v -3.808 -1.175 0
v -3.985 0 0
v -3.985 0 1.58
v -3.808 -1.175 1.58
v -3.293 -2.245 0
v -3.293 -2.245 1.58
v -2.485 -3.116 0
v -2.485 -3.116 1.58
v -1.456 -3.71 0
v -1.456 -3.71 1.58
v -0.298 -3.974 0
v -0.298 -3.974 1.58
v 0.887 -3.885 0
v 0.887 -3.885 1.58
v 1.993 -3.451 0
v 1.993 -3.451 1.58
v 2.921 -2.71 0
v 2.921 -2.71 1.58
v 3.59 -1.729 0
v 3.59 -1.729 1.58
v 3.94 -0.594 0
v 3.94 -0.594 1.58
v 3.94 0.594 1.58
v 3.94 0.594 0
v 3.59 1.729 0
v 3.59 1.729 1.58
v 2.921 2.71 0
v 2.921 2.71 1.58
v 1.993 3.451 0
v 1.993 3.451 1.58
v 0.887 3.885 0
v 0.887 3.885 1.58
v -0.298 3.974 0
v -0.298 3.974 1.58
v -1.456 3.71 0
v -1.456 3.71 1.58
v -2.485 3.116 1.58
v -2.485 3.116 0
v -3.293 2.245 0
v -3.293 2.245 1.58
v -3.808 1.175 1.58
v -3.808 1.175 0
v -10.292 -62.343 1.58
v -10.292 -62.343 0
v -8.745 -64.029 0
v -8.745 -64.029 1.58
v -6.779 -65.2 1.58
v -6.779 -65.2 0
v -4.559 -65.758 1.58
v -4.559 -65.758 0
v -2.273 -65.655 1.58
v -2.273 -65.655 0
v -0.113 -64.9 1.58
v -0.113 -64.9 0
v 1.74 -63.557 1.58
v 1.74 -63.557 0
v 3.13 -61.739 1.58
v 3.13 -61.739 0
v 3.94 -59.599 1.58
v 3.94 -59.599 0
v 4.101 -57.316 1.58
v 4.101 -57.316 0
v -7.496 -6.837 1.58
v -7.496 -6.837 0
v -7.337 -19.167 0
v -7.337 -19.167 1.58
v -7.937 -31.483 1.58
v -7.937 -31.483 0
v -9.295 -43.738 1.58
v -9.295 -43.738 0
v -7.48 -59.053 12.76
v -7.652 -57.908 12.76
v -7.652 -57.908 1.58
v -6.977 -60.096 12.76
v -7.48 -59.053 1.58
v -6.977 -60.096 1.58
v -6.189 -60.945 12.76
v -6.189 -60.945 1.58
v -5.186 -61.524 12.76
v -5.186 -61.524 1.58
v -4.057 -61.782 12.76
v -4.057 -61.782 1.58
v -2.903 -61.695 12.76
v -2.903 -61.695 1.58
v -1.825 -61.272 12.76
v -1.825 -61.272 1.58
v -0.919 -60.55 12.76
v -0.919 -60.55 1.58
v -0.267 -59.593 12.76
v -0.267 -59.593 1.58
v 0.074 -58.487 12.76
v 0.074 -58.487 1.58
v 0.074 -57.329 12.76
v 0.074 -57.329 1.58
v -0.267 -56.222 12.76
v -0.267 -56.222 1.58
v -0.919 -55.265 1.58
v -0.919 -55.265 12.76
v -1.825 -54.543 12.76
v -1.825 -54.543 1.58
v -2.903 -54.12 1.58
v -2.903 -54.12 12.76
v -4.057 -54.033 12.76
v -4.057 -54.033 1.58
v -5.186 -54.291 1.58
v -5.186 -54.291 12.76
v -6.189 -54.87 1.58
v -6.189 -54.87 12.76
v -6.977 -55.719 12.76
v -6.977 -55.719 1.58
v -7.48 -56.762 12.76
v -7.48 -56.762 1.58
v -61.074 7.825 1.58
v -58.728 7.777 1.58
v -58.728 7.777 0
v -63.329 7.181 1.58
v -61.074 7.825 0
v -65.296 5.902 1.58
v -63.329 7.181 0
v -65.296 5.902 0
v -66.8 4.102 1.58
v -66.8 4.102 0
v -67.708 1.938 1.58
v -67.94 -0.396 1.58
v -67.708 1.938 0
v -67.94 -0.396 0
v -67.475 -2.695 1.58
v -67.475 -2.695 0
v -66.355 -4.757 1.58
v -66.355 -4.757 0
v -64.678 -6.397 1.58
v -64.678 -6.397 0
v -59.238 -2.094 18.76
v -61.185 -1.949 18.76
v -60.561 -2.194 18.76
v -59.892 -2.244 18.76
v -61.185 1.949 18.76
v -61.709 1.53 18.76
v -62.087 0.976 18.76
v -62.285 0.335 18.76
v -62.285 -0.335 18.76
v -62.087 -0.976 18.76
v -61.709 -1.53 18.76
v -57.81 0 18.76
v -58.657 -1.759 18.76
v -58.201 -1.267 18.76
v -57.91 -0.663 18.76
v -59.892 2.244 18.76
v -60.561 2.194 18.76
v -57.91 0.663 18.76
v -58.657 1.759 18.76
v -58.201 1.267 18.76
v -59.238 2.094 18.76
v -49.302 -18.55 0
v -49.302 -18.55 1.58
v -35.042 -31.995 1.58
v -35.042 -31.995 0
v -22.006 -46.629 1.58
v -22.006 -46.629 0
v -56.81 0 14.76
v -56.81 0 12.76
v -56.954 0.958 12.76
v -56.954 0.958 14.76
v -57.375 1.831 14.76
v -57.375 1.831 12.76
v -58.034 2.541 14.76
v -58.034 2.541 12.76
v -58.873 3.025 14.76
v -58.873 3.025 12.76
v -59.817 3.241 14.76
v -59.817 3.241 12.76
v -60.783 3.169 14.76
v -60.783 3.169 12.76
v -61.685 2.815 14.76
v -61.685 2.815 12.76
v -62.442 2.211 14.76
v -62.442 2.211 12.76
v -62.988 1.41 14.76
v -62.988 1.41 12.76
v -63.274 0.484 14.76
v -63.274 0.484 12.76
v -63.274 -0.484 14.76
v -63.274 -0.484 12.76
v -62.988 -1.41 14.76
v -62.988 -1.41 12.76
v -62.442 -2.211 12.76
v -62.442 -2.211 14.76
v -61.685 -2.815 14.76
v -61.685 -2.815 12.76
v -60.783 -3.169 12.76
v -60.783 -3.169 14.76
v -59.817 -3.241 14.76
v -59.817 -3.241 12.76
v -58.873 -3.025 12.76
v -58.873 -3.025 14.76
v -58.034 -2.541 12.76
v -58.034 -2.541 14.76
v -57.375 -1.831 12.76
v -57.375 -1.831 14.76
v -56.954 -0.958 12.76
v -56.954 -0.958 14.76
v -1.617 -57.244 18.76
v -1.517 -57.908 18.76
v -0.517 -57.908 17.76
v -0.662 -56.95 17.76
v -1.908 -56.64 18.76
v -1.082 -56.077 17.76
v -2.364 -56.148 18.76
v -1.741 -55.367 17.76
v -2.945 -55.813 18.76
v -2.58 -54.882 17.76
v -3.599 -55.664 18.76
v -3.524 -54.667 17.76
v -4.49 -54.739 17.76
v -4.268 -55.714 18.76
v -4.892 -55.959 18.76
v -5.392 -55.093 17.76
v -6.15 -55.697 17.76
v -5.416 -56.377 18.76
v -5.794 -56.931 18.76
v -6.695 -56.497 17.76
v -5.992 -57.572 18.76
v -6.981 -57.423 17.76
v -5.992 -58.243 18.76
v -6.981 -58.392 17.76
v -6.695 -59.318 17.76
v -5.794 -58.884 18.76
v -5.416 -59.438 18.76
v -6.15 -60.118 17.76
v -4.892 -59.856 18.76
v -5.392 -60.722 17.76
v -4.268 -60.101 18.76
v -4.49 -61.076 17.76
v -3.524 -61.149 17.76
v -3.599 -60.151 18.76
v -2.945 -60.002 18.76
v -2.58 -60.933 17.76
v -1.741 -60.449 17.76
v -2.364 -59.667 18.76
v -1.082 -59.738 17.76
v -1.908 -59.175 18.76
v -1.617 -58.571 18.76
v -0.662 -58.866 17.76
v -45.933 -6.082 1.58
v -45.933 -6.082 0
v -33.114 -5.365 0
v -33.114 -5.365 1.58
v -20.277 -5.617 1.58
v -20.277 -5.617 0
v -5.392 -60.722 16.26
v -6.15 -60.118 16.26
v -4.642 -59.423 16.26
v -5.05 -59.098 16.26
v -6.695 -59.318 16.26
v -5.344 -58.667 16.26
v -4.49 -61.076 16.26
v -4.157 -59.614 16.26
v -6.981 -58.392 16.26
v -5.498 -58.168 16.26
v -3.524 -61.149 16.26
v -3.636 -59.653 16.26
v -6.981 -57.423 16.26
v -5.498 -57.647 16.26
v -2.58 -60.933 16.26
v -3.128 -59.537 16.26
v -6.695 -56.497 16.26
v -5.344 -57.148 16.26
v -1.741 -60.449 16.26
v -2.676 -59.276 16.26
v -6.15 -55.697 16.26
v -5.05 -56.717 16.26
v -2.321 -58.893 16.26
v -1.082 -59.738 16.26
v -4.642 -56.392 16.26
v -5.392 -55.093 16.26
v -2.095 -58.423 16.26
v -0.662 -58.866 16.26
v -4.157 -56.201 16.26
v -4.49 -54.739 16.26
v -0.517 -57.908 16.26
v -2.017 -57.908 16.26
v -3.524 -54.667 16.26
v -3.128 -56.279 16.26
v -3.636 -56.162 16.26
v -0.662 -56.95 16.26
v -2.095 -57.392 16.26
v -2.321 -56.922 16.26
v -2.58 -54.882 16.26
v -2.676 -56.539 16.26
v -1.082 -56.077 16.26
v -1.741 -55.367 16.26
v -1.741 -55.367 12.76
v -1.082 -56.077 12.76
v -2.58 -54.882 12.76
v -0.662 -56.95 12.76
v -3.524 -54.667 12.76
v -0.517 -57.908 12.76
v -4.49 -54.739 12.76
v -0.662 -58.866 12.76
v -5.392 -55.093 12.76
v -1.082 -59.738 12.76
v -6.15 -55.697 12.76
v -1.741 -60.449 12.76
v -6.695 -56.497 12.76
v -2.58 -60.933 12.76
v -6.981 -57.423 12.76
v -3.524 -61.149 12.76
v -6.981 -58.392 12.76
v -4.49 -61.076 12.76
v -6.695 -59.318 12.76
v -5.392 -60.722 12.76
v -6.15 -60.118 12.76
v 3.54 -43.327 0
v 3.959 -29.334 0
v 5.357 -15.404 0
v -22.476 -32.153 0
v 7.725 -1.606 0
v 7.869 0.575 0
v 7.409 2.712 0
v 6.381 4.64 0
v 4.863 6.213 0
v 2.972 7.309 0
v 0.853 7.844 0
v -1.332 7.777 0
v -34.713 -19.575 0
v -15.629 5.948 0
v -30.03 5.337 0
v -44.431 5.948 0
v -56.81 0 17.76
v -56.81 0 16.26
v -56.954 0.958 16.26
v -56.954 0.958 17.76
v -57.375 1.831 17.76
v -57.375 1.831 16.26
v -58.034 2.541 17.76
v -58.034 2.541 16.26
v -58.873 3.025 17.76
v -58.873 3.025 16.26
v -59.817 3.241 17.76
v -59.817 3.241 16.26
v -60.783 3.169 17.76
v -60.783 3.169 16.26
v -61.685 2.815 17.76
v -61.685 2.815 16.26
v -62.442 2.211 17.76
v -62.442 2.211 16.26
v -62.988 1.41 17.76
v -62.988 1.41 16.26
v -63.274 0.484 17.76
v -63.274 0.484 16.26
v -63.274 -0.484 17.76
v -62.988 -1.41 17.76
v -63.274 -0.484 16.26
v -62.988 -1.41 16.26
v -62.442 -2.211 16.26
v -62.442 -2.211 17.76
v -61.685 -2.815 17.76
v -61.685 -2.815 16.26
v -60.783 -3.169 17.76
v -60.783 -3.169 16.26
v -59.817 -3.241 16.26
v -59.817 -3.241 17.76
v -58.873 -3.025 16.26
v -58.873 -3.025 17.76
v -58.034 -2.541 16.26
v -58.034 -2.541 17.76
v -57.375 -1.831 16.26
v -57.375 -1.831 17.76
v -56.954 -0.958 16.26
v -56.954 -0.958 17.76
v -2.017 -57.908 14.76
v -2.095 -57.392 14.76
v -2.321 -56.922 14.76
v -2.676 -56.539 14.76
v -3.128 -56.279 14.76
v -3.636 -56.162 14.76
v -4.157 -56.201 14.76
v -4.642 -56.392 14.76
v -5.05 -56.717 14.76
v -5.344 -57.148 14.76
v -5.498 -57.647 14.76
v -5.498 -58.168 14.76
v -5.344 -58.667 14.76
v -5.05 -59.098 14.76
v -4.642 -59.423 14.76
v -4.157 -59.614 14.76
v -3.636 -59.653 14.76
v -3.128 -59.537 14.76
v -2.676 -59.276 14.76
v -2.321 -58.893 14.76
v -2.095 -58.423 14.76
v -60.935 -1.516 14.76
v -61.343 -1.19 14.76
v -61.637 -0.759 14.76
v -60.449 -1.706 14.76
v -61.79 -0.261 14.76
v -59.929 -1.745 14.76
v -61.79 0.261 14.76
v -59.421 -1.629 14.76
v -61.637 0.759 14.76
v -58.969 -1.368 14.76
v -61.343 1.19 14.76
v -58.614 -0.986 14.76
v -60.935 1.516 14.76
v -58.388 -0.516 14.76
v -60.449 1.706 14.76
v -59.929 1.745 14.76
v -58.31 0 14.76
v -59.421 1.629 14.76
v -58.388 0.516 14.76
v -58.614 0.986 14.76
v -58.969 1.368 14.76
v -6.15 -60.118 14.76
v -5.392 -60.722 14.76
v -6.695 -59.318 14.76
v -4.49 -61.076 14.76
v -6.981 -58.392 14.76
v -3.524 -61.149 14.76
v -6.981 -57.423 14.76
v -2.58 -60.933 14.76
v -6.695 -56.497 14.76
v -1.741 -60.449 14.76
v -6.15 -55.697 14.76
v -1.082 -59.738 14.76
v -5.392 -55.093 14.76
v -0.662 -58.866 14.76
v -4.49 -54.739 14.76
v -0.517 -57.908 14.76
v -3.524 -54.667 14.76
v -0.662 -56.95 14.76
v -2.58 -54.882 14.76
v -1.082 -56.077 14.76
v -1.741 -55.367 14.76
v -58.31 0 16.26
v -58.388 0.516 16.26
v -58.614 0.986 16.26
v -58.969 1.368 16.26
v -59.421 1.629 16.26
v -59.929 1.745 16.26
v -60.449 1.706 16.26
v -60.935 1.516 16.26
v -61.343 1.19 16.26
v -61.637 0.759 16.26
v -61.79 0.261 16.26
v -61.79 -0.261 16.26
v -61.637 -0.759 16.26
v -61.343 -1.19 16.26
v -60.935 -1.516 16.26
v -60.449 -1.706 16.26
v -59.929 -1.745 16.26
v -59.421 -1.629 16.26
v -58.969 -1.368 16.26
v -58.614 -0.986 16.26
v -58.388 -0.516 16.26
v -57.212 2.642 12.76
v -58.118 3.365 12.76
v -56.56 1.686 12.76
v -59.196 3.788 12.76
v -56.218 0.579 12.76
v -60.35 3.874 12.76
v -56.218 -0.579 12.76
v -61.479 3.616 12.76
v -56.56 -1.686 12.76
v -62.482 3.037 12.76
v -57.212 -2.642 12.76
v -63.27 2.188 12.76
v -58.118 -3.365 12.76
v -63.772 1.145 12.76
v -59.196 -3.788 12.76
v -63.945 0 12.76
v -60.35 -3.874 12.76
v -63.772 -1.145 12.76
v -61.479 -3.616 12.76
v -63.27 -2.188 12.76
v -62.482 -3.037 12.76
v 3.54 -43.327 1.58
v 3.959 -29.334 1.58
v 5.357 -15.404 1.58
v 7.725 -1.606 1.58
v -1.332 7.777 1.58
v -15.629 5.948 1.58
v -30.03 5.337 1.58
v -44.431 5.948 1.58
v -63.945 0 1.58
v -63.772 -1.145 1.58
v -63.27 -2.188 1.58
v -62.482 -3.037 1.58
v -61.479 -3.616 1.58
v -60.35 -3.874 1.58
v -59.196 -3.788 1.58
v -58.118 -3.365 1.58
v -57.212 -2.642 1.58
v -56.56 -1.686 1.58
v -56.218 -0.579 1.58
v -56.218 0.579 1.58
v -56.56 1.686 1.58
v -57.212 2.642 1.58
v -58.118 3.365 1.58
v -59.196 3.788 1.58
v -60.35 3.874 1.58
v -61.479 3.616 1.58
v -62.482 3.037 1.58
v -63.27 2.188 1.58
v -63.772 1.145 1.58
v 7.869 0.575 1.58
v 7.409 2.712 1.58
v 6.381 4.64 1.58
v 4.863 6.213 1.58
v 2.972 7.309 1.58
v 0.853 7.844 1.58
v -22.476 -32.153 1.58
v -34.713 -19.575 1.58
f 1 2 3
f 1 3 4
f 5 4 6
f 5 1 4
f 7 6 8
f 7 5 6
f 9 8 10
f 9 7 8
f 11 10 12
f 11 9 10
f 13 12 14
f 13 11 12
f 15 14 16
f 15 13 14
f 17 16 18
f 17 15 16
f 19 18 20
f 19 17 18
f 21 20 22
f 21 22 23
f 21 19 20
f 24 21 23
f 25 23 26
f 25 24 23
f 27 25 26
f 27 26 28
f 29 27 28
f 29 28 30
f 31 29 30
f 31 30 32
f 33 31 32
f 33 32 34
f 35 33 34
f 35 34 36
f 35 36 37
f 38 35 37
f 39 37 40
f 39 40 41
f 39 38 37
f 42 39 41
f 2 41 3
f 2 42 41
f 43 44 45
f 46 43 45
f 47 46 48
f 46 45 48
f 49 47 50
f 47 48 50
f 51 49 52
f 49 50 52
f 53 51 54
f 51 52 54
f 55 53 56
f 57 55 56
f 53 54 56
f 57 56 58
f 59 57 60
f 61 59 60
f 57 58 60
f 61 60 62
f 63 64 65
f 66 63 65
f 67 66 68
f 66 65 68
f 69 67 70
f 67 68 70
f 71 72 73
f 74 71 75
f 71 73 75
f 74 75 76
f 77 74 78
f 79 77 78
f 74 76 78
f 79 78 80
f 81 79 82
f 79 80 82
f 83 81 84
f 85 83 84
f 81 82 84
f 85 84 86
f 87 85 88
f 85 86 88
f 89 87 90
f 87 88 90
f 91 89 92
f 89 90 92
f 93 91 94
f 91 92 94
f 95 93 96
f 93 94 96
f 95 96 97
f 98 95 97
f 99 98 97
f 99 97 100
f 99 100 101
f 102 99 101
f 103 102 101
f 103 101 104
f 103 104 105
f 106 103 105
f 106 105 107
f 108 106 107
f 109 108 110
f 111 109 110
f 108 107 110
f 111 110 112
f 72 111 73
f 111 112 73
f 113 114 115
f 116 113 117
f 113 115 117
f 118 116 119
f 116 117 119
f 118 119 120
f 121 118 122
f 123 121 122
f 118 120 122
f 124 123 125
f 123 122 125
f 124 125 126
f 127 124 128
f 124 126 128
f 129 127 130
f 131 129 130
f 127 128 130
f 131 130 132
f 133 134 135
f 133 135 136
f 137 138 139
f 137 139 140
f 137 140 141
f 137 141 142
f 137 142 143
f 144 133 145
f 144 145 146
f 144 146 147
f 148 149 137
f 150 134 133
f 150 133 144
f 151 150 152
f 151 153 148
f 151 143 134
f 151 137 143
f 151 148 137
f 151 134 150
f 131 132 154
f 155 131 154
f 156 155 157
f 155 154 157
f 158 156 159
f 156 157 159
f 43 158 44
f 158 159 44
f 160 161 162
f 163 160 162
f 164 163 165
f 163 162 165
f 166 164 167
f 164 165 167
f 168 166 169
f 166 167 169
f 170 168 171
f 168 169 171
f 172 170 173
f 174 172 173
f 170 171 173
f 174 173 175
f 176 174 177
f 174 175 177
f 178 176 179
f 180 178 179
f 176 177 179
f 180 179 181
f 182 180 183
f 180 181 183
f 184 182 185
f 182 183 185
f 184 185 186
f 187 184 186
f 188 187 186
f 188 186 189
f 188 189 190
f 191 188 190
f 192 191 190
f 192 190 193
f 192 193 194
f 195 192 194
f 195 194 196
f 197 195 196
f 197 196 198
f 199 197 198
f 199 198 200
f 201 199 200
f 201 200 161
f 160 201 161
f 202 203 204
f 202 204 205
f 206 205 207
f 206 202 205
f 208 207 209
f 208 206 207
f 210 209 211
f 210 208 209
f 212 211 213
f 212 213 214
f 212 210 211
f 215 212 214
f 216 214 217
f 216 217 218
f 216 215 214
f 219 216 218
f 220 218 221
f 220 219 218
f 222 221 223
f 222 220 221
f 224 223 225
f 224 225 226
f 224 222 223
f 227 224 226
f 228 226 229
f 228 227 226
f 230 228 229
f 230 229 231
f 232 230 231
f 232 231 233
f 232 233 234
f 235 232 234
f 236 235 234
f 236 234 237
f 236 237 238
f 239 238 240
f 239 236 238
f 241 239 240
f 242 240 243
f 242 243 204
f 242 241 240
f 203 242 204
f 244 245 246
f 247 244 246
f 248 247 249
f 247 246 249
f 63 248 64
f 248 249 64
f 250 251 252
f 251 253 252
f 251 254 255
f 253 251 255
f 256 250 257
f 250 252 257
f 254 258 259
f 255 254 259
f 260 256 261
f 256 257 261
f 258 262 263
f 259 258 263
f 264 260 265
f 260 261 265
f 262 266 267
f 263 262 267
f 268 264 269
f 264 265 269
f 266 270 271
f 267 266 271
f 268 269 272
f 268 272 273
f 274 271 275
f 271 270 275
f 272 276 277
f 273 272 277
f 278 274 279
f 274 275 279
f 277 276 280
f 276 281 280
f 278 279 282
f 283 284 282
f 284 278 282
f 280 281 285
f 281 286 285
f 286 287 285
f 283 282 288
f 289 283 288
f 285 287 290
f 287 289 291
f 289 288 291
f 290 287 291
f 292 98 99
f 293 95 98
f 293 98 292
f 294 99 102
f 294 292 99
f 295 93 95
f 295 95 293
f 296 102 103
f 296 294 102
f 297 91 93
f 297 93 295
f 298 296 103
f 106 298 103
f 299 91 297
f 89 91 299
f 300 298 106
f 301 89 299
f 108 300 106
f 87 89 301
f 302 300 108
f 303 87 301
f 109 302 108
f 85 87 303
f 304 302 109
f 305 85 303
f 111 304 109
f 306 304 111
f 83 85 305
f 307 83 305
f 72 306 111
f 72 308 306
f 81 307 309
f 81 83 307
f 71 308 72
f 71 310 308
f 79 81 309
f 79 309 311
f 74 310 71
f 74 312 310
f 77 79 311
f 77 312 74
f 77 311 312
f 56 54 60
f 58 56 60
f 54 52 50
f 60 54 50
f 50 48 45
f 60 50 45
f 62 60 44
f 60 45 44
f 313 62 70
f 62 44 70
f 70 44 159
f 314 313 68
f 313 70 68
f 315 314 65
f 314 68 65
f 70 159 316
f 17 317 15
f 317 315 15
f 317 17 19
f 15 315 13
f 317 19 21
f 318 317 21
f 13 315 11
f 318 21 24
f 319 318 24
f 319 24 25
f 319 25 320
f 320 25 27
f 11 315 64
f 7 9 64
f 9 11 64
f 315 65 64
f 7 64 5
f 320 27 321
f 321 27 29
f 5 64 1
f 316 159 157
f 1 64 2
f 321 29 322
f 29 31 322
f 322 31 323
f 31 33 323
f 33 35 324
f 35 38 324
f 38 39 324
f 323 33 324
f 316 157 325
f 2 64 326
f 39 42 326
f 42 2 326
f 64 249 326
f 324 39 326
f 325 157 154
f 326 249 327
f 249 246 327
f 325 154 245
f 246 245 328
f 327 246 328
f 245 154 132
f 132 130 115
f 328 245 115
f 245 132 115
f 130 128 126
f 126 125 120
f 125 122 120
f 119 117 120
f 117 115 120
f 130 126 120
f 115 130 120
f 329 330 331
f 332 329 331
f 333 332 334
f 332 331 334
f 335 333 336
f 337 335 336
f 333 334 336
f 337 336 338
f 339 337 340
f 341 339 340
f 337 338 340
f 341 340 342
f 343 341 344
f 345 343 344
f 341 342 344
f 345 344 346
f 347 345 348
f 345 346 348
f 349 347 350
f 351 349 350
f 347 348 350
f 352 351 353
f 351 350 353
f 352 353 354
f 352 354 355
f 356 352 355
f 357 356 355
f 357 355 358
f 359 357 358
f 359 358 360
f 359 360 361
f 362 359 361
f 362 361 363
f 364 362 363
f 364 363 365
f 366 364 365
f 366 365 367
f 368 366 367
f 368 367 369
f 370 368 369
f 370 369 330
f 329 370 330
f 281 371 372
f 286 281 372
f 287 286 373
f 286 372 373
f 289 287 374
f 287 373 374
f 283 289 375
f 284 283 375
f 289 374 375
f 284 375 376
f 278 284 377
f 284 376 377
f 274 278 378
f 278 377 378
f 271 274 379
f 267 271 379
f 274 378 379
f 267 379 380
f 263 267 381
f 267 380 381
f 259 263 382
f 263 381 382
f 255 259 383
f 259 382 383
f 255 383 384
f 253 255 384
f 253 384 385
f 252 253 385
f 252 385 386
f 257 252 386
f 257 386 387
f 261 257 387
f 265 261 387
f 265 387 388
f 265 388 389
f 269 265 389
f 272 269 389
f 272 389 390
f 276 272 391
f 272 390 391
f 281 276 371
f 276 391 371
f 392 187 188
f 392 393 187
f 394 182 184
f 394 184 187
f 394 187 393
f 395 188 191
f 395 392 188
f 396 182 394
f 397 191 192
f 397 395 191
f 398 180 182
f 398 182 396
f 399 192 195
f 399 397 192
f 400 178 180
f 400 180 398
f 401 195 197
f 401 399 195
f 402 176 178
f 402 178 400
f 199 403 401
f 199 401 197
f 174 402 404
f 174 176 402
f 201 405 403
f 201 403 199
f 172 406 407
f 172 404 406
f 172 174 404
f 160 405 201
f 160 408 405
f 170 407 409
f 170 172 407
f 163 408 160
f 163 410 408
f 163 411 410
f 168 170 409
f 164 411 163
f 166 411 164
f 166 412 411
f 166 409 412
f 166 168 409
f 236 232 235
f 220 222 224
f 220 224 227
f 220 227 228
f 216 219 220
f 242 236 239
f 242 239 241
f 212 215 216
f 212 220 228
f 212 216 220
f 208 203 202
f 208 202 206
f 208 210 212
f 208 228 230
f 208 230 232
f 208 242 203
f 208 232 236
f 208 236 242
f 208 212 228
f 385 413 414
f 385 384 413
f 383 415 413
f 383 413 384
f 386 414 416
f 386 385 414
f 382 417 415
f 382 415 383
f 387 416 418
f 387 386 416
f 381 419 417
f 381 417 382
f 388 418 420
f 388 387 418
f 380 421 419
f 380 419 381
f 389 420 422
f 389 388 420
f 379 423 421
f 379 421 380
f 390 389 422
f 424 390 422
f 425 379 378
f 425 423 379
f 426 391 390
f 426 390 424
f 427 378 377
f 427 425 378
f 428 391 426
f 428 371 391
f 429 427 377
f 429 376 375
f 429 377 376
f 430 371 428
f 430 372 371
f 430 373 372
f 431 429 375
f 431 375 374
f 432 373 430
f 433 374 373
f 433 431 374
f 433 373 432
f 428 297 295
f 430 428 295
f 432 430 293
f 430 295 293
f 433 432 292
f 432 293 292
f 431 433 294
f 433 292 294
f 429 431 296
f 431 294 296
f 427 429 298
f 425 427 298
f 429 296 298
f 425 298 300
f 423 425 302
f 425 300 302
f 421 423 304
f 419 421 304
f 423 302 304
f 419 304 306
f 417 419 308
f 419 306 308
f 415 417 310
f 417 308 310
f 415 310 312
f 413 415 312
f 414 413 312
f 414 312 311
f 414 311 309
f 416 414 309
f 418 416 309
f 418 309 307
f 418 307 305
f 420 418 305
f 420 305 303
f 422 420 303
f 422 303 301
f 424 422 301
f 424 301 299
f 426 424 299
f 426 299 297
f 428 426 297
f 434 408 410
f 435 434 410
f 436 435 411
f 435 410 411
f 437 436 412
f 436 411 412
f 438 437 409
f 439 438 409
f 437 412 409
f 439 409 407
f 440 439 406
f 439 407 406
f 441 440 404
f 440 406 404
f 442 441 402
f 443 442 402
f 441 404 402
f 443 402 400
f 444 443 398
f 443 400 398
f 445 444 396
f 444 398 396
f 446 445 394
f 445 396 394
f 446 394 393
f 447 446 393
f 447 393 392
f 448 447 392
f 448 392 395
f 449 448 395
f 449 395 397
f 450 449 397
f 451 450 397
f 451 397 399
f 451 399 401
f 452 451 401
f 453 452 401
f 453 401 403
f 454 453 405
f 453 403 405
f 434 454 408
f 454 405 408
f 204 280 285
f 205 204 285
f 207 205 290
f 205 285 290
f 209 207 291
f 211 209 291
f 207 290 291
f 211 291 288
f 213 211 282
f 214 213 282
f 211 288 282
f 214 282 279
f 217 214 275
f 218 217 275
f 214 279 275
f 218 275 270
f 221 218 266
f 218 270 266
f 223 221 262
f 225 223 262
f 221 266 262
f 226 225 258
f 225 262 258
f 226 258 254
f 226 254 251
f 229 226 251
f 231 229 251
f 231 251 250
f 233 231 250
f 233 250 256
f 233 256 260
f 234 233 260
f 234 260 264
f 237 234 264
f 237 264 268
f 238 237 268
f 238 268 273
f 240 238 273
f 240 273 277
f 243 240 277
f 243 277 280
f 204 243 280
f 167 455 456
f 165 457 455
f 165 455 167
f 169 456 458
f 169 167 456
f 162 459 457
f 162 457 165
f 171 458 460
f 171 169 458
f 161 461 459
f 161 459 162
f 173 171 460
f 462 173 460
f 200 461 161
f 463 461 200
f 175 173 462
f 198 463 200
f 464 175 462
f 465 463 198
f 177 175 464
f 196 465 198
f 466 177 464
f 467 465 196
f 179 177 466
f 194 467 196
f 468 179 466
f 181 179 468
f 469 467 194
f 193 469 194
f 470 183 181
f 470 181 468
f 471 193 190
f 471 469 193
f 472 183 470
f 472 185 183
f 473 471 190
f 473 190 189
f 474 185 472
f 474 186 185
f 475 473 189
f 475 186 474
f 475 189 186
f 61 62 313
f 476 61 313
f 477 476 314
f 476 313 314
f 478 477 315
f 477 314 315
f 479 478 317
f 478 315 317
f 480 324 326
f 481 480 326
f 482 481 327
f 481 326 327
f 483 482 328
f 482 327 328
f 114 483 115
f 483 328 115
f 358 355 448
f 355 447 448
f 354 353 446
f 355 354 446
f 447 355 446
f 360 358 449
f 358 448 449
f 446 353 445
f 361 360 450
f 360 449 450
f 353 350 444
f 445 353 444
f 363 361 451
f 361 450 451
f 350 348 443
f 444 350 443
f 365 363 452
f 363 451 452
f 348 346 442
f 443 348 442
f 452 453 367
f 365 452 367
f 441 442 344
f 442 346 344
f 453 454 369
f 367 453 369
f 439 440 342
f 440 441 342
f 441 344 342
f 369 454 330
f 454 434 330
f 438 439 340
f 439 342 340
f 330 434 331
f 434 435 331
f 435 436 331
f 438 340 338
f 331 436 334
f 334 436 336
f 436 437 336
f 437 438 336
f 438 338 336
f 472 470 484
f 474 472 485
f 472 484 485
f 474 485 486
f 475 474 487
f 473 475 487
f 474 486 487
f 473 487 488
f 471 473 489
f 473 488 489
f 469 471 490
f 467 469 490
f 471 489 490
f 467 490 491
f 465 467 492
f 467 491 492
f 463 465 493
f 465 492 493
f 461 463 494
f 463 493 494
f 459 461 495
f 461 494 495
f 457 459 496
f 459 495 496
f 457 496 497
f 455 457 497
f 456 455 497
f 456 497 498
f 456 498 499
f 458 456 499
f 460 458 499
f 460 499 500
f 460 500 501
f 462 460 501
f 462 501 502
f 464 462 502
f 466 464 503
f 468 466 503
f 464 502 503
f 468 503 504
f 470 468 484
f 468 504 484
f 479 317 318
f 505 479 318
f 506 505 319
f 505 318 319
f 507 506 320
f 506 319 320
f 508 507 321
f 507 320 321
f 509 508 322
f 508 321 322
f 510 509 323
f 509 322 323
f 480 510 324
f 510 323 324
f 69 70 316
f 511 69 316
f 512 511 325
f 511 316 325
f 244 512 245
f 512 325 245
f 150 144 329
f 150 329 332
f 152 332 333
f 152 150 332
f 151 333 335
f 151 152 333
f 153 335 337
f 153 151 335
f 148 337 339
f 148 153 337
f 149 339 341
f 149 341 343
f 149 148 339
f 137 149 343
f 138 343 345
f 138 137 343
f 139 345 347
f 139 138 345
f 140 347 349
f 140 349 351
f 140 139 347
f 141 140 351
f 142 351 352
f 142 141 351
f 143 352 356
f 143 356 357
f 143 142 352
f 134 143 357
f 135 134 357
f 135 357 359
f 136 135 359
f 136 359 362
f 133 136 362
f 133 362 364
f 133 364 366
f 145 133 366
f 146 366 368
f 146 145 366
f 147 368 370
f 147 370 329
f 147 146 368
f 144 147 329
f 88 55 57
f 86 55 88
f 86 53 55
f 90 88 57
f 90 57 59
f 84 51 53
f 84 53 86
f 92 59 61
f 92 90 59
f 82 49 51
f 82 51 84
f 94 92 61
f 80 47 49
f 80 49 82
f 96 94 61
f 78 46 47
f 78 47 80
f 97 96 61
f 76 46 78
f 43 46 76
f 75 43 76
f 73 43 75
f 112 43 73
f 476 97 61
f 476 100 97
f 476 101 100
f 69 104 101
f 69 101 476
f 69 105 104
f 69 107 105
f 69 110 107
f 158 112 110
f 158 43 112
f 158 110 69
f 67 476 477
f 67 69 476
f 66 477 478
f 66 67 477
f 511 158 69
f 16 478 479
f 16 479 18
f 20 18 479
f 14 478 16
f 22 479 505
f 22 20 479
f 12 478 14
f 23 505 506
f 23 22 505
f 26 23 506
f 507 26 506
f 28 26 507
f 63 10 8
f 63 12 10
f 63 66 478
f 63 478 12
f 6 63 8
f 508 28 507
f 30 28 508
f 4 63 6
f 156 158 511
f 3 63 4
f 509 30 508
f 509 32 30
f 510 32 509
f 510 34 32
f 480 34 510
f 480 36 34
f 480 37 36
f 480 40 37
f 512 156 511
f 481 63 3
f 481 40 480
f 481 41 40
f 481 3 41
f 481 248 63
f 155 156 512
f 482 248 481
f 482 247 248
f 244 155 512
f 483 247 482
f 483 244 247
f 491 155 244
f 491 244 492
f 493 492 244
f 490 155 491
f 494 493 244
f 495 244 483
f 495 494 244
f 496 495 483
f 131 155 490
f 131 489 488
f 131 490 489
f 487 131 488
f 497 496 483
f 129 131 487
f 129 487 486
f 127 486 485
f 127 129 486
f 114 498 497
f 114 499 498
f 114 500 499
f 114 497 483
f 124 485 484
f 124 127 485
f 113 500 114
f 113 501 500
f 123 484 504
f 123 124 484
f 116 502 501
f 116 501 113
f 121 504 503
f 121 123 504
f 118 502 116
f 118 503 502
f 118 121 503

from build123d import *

# Parameters (mm, degrees)
ESQUISSE1_R             = 7.89
ESQUISSE1_R_2           = 3.885
ESQUISSE1_R_3           = 3.985
BOSS_EXTRU_1_DEPTH      = 1.58
BOSS_EXTRU_2_START      = 1.58
ESQUISSE1_3_R           = 3.885
BOSS_EXTRU_2_DEPTH      = 11.18
ESQUISSE2_R             = 3.25
BOSS_EXTRU_3_DEPTH      = 6
ENL_V_START             = -4
ESQUISSE3_R             = 3.25
ESQUISSE3_R_2           = 1.75
ENL_V_MAT_EXTRU_1_DEPTH = 1.5
CHANFREIN1_SIZE         = 1


with BuildPart() as part:
    # Esquisse1 → Boss.-Extru.1 (new body)
    # profile 1 of 11: a face of its own
    with BuildSketch(Plane(origin=(0, 0, 0), x_dir=(0, 1, 0), z_dir=(0, 0, 1))):
        with Locations((-57.907596038, 3.76712371)):
            Circle(ESQUISSE1_R)
        with Locations((-57.907596038, 3.76712371)):
            Circle(ESQUISSE1_R_2, mode=Mode.SUBTRACT)
    # profile 2 of 11: a face of its own
    with BuildSketch(Plane(origin=(0, 0, 0), x_dir=(0, 1, 0), z_dir=(0, 0, 1))):
        with Locations((-57.907596038, 3.76712371)):
            Circle(ESQUISSE1_R_2)
    # profile 3 of 11: a face of its own
    with BuildSketch(Plane(origin=(0, 0, 0), x_dir=(0, 1, 0), z_dir=(0, 0, 1))):
        with BuildLine():
            ThreePointArc((-56.301538768, 11.491933095), (-51.786979572, 8.746094895), (-50.017596038, 3.76712371))
            ThreePointArc((-50.017596038, 3.76712371), (-50.400051579, 1.340423031), (-51.510340319, -0.851016528))
            ThreePointArc((-51.510340319, -0.851016528), (-47.696280505, 4.277310952), (-43.738103365, 9.295241675))
            ThreePointArc((-43.738103365, 9.295241675), (-50.037335941, 10.293415373), (-56.301538768, 11.491933095))
        make_face()
    # profile 4 of 11: a face of its own
    with BuildSketch(Plane(origin=(0, 0, 0), x_dir=(0, 1, 0), z_dir=(0, 0, 1))):
        with BuildLine():
            ThreePointArc((-62.343020281, 10.292390891), (-59.444168438, 11.506054208), (-56.301538768, 11.491933095))
            ThreePointArc((-56.301538768, 11.491933095), (-50.037335941, 10.293415373), (-43.738103365, 9.295241675))
            ThreePointArc((-43.738103365, 9.295241675), (-25.983312523, 28.716933044), (-6.082429339, 45.932900691))
            ThreePointArc((-6.082429339, 45.932900691), (-6.808122629, 52.346571885), (-7.776764583, 58.728071842))
            ThreePointArc((-7.776764583, 58.728071842), (-7.686126552, 61.842009718), (-6.39725572, 64.678140238))
            ThreePointArc((-6.39725572, 64.678140238), (-31.994708958, 35.041699087), (-62.343020281, 10.292390891))
        make_face()
    # profile 5 of 11: a face of its own
    with BuildSketch(Plane(origin=(0, 0, 0), x_dir=(0, 1, 0), z_dir=(0, 0, 1))):
        with BuildLine():
            ThreePointArc((-7.776764583, 58.728071842), (-6.808122629, 52.346571885), (-6.082429339, 45.932900691))
            ThreePointArc((-6.082429339, 45.932900691), (-0.878320654, 49.809662788), (4.435424243, 53.534732819))
            ThreePointArc((4.435424243, 53.534732819), (-3.087690297, 52.799265283), (-7.776764583, 58.728071842))
        make_face()
    # profile 6 of 11: a face of its own
    with BuildSketch(Plane(origin=(0, 0, 0), x_dir=(0, 1, 0), z_dir=(0, 0, 1))):
        with Locations((0, 60.06)):
            Circle(ESQUISSE1_R)
        with Locations((0, 60.06)):
            Circle(ESQUISSE1_R_2, mode=Mode.SUBTRACT)
    # profile 7 of 11: a face of its own
    with BuildSketch(Plane(origin=(0, 0, 0), x_dir=(0, 1, 0), z_dir=(0, 0, 1))):
        with Locations((0, 60.06)):
            Circle(ESQUISSE1_R_2)
    # profile 8 of 11: a face of its own
    with BuildSketch(Plane(origin=(0, 0, 0), x_dir=(0, 1, 0), z_dir=(0, 0, 1))):
        with BuildLine():
            ThreePointArc((-43.738103365, 9.295241675), (-47.696280505, 4.277310952), (-51.510340319, -0.851016528))
            ThreePointArc((-51.510340319, -0.851016528), (-54.053844003, -3.117692573), (-57.315900013, -4.100658431))
            ThreePointArc((-57.315900013, -4.100658431), (-29.333901967, -3.959332501), (-1.606057271, -7.724809386))
            ThreePointArc((-1.606057271, -7.724809386), (-6.520388042, -4.442593812), (-7.776764583, 1.331928158))
            ThreePointArc((-7.776764583, 1.331928158), (-7.278629827, 4.40977224), (-6.837025839, 7.496234348))
            ThreePointArc((-6.837025839, 7.496234348), (-25.32919367, 7.541846284), (-43.738103365, 9.295241675))
        make_face()
    # profile 9 of 11: a face of its own
    with BuildSketch(Plane(origin=(0, 0, 0), x_dir=(0, 1, 0), z_dir=(0, 0, 1))):
        with BuildLine():
            ThreePointArc((4.435424243, 53.534732819), (-0.878320654, 49.809662788), (-6.082429339, 45.932900691))
            ThreePointArc((-6.082429339, 45.932900691), (-5.369716255, 26.693168194), (-6.837025839, 7.496234348))
            ThreePointArc((-6.837025839, 7.496234348), (-3.712908005, 7.657586059), (-0.591696025, 7.867782141))
            ThreePointArc((-0.591696025, 7.867782141), (4.85650588, 6.218235331), (7.776764583, 1.331928158))
            ThreePointArc((7.776764583, 1.331928158), (5.336964728, 30.03), (7.776764583, 58.728071842))
            ThreePointArc((7.776764583, 58.728071842), (6.635290614, 55.790922996), (4.435424243, 53.534732819))
        make_face()
    # profile 10 of 11: a face of its own
    with BuildSketch(Plane(origin=(0, 0, 0), x_dir=(0, 1, 0), z_dir=(0, 0, 1))):
        with BuildLine():
            ThreePointArc((-0.591696025, 7.867782141), (-3.712908005, 7.657586059), (-6.837025839, 7.496234348))
            ThreePointArc((-6.837025839, 7.496234348), (-7.278629827, 4.40977224), (-7.776764583, 1.331928158))
            ThreePointArc((-7.776764583, 1.331928158), (-5.309155306, 5.836520362), (-0.591696025, 7.867782141))
        make_face()
    # profile 11 of 11: a face of its own
    with BuildSketch(Plane(origin=(0, 0, 0), x_dir=(0, 1, 0), z_dir=(0, 0, 1))):
        Circle(ESQUISSE1_R)
        with Locations(Location((0, 0, 0), (0, 0, 90))):
            Circle(ESQUISSE1_R_3, mode=Mode.SUBTRACT)
    extrude(amount=BOSS_EXTRU_1_DEPTH)

    # Esquisse1<3> → Boss.-Extru.2 (add)
    with BuildSketch(Plane(origin=(0, 0, 0), x_dir=(0, 1, 0), z_dir=(0, 0, 1)).offset(BOSS_EXTRU_2_START)):
        with Locations(Location((0, 60.06, 0), (0, 0, 90))):
            Circle(ESQUISSE1_3_R)
        with Locations(Location((-57.907596038, 3.76712371, 0), (0, 0, 90))):
            Circle(ESQUISSE1_3_R)
    extrude(amount=BOSS_EXTRU_2_DEPTH)

    # Esquisse2 → Boss.-Extru.3 (add)
    with BuildSketch(Plane.XY.offset(12.76)):
        with Locations((-3.76712371, -57.907596038)):
            Circle(ESQUISSE2_R)
        with Locations((-60.06, 0)):
            Circle(ESQUISSE2_R)
    extrude(amount=BOSS_EXTRU_3_DEPTH)

    # Esquisse3 → Enlèv. mat.-Extru.1 (cut)
    # profile 1 of 2: a face of its own
    with BuildSketch(Plane.XY.offset(18.76).offset(ENL_V_START)):
        with Locations((-60.06, 0)):
            Circle(ESQUISSE3_R)
        with Locations((-60.06, 0)):
            Circle(ESQUISSE3_R_2, mode=Mode.SUBTRACT)
    # profile 2 of 2: a face of its own
    with BuildSketch(Plane.XY.offset(18.76).offset(ENL_V_START)):
        with Locations((-3.76712371, -57.907596038)):
            Circle(ESQUISSE3_R)
        with Locations((-3.76712371, -57.907596038)):
            Circle(ESQUISSE3_R_2, mode=Mode.SUBTRACT)
    extrude(amount=ENL_V_MAT_EXTRU_1_DEPTH, mode=Mode.SUBTRACT)

    # Chanfrein1
    chanfrein1_edges = [part.edges().sort_by_distance(p)[0] for p in [
        (-7.01712371, -57.907596038, 18.76),
        (-63.31, 0, 18.76),
    ]]
    chamfer(chanfrein1_edges, length=CHANFREIN1_SIZE)


solid = part.part
